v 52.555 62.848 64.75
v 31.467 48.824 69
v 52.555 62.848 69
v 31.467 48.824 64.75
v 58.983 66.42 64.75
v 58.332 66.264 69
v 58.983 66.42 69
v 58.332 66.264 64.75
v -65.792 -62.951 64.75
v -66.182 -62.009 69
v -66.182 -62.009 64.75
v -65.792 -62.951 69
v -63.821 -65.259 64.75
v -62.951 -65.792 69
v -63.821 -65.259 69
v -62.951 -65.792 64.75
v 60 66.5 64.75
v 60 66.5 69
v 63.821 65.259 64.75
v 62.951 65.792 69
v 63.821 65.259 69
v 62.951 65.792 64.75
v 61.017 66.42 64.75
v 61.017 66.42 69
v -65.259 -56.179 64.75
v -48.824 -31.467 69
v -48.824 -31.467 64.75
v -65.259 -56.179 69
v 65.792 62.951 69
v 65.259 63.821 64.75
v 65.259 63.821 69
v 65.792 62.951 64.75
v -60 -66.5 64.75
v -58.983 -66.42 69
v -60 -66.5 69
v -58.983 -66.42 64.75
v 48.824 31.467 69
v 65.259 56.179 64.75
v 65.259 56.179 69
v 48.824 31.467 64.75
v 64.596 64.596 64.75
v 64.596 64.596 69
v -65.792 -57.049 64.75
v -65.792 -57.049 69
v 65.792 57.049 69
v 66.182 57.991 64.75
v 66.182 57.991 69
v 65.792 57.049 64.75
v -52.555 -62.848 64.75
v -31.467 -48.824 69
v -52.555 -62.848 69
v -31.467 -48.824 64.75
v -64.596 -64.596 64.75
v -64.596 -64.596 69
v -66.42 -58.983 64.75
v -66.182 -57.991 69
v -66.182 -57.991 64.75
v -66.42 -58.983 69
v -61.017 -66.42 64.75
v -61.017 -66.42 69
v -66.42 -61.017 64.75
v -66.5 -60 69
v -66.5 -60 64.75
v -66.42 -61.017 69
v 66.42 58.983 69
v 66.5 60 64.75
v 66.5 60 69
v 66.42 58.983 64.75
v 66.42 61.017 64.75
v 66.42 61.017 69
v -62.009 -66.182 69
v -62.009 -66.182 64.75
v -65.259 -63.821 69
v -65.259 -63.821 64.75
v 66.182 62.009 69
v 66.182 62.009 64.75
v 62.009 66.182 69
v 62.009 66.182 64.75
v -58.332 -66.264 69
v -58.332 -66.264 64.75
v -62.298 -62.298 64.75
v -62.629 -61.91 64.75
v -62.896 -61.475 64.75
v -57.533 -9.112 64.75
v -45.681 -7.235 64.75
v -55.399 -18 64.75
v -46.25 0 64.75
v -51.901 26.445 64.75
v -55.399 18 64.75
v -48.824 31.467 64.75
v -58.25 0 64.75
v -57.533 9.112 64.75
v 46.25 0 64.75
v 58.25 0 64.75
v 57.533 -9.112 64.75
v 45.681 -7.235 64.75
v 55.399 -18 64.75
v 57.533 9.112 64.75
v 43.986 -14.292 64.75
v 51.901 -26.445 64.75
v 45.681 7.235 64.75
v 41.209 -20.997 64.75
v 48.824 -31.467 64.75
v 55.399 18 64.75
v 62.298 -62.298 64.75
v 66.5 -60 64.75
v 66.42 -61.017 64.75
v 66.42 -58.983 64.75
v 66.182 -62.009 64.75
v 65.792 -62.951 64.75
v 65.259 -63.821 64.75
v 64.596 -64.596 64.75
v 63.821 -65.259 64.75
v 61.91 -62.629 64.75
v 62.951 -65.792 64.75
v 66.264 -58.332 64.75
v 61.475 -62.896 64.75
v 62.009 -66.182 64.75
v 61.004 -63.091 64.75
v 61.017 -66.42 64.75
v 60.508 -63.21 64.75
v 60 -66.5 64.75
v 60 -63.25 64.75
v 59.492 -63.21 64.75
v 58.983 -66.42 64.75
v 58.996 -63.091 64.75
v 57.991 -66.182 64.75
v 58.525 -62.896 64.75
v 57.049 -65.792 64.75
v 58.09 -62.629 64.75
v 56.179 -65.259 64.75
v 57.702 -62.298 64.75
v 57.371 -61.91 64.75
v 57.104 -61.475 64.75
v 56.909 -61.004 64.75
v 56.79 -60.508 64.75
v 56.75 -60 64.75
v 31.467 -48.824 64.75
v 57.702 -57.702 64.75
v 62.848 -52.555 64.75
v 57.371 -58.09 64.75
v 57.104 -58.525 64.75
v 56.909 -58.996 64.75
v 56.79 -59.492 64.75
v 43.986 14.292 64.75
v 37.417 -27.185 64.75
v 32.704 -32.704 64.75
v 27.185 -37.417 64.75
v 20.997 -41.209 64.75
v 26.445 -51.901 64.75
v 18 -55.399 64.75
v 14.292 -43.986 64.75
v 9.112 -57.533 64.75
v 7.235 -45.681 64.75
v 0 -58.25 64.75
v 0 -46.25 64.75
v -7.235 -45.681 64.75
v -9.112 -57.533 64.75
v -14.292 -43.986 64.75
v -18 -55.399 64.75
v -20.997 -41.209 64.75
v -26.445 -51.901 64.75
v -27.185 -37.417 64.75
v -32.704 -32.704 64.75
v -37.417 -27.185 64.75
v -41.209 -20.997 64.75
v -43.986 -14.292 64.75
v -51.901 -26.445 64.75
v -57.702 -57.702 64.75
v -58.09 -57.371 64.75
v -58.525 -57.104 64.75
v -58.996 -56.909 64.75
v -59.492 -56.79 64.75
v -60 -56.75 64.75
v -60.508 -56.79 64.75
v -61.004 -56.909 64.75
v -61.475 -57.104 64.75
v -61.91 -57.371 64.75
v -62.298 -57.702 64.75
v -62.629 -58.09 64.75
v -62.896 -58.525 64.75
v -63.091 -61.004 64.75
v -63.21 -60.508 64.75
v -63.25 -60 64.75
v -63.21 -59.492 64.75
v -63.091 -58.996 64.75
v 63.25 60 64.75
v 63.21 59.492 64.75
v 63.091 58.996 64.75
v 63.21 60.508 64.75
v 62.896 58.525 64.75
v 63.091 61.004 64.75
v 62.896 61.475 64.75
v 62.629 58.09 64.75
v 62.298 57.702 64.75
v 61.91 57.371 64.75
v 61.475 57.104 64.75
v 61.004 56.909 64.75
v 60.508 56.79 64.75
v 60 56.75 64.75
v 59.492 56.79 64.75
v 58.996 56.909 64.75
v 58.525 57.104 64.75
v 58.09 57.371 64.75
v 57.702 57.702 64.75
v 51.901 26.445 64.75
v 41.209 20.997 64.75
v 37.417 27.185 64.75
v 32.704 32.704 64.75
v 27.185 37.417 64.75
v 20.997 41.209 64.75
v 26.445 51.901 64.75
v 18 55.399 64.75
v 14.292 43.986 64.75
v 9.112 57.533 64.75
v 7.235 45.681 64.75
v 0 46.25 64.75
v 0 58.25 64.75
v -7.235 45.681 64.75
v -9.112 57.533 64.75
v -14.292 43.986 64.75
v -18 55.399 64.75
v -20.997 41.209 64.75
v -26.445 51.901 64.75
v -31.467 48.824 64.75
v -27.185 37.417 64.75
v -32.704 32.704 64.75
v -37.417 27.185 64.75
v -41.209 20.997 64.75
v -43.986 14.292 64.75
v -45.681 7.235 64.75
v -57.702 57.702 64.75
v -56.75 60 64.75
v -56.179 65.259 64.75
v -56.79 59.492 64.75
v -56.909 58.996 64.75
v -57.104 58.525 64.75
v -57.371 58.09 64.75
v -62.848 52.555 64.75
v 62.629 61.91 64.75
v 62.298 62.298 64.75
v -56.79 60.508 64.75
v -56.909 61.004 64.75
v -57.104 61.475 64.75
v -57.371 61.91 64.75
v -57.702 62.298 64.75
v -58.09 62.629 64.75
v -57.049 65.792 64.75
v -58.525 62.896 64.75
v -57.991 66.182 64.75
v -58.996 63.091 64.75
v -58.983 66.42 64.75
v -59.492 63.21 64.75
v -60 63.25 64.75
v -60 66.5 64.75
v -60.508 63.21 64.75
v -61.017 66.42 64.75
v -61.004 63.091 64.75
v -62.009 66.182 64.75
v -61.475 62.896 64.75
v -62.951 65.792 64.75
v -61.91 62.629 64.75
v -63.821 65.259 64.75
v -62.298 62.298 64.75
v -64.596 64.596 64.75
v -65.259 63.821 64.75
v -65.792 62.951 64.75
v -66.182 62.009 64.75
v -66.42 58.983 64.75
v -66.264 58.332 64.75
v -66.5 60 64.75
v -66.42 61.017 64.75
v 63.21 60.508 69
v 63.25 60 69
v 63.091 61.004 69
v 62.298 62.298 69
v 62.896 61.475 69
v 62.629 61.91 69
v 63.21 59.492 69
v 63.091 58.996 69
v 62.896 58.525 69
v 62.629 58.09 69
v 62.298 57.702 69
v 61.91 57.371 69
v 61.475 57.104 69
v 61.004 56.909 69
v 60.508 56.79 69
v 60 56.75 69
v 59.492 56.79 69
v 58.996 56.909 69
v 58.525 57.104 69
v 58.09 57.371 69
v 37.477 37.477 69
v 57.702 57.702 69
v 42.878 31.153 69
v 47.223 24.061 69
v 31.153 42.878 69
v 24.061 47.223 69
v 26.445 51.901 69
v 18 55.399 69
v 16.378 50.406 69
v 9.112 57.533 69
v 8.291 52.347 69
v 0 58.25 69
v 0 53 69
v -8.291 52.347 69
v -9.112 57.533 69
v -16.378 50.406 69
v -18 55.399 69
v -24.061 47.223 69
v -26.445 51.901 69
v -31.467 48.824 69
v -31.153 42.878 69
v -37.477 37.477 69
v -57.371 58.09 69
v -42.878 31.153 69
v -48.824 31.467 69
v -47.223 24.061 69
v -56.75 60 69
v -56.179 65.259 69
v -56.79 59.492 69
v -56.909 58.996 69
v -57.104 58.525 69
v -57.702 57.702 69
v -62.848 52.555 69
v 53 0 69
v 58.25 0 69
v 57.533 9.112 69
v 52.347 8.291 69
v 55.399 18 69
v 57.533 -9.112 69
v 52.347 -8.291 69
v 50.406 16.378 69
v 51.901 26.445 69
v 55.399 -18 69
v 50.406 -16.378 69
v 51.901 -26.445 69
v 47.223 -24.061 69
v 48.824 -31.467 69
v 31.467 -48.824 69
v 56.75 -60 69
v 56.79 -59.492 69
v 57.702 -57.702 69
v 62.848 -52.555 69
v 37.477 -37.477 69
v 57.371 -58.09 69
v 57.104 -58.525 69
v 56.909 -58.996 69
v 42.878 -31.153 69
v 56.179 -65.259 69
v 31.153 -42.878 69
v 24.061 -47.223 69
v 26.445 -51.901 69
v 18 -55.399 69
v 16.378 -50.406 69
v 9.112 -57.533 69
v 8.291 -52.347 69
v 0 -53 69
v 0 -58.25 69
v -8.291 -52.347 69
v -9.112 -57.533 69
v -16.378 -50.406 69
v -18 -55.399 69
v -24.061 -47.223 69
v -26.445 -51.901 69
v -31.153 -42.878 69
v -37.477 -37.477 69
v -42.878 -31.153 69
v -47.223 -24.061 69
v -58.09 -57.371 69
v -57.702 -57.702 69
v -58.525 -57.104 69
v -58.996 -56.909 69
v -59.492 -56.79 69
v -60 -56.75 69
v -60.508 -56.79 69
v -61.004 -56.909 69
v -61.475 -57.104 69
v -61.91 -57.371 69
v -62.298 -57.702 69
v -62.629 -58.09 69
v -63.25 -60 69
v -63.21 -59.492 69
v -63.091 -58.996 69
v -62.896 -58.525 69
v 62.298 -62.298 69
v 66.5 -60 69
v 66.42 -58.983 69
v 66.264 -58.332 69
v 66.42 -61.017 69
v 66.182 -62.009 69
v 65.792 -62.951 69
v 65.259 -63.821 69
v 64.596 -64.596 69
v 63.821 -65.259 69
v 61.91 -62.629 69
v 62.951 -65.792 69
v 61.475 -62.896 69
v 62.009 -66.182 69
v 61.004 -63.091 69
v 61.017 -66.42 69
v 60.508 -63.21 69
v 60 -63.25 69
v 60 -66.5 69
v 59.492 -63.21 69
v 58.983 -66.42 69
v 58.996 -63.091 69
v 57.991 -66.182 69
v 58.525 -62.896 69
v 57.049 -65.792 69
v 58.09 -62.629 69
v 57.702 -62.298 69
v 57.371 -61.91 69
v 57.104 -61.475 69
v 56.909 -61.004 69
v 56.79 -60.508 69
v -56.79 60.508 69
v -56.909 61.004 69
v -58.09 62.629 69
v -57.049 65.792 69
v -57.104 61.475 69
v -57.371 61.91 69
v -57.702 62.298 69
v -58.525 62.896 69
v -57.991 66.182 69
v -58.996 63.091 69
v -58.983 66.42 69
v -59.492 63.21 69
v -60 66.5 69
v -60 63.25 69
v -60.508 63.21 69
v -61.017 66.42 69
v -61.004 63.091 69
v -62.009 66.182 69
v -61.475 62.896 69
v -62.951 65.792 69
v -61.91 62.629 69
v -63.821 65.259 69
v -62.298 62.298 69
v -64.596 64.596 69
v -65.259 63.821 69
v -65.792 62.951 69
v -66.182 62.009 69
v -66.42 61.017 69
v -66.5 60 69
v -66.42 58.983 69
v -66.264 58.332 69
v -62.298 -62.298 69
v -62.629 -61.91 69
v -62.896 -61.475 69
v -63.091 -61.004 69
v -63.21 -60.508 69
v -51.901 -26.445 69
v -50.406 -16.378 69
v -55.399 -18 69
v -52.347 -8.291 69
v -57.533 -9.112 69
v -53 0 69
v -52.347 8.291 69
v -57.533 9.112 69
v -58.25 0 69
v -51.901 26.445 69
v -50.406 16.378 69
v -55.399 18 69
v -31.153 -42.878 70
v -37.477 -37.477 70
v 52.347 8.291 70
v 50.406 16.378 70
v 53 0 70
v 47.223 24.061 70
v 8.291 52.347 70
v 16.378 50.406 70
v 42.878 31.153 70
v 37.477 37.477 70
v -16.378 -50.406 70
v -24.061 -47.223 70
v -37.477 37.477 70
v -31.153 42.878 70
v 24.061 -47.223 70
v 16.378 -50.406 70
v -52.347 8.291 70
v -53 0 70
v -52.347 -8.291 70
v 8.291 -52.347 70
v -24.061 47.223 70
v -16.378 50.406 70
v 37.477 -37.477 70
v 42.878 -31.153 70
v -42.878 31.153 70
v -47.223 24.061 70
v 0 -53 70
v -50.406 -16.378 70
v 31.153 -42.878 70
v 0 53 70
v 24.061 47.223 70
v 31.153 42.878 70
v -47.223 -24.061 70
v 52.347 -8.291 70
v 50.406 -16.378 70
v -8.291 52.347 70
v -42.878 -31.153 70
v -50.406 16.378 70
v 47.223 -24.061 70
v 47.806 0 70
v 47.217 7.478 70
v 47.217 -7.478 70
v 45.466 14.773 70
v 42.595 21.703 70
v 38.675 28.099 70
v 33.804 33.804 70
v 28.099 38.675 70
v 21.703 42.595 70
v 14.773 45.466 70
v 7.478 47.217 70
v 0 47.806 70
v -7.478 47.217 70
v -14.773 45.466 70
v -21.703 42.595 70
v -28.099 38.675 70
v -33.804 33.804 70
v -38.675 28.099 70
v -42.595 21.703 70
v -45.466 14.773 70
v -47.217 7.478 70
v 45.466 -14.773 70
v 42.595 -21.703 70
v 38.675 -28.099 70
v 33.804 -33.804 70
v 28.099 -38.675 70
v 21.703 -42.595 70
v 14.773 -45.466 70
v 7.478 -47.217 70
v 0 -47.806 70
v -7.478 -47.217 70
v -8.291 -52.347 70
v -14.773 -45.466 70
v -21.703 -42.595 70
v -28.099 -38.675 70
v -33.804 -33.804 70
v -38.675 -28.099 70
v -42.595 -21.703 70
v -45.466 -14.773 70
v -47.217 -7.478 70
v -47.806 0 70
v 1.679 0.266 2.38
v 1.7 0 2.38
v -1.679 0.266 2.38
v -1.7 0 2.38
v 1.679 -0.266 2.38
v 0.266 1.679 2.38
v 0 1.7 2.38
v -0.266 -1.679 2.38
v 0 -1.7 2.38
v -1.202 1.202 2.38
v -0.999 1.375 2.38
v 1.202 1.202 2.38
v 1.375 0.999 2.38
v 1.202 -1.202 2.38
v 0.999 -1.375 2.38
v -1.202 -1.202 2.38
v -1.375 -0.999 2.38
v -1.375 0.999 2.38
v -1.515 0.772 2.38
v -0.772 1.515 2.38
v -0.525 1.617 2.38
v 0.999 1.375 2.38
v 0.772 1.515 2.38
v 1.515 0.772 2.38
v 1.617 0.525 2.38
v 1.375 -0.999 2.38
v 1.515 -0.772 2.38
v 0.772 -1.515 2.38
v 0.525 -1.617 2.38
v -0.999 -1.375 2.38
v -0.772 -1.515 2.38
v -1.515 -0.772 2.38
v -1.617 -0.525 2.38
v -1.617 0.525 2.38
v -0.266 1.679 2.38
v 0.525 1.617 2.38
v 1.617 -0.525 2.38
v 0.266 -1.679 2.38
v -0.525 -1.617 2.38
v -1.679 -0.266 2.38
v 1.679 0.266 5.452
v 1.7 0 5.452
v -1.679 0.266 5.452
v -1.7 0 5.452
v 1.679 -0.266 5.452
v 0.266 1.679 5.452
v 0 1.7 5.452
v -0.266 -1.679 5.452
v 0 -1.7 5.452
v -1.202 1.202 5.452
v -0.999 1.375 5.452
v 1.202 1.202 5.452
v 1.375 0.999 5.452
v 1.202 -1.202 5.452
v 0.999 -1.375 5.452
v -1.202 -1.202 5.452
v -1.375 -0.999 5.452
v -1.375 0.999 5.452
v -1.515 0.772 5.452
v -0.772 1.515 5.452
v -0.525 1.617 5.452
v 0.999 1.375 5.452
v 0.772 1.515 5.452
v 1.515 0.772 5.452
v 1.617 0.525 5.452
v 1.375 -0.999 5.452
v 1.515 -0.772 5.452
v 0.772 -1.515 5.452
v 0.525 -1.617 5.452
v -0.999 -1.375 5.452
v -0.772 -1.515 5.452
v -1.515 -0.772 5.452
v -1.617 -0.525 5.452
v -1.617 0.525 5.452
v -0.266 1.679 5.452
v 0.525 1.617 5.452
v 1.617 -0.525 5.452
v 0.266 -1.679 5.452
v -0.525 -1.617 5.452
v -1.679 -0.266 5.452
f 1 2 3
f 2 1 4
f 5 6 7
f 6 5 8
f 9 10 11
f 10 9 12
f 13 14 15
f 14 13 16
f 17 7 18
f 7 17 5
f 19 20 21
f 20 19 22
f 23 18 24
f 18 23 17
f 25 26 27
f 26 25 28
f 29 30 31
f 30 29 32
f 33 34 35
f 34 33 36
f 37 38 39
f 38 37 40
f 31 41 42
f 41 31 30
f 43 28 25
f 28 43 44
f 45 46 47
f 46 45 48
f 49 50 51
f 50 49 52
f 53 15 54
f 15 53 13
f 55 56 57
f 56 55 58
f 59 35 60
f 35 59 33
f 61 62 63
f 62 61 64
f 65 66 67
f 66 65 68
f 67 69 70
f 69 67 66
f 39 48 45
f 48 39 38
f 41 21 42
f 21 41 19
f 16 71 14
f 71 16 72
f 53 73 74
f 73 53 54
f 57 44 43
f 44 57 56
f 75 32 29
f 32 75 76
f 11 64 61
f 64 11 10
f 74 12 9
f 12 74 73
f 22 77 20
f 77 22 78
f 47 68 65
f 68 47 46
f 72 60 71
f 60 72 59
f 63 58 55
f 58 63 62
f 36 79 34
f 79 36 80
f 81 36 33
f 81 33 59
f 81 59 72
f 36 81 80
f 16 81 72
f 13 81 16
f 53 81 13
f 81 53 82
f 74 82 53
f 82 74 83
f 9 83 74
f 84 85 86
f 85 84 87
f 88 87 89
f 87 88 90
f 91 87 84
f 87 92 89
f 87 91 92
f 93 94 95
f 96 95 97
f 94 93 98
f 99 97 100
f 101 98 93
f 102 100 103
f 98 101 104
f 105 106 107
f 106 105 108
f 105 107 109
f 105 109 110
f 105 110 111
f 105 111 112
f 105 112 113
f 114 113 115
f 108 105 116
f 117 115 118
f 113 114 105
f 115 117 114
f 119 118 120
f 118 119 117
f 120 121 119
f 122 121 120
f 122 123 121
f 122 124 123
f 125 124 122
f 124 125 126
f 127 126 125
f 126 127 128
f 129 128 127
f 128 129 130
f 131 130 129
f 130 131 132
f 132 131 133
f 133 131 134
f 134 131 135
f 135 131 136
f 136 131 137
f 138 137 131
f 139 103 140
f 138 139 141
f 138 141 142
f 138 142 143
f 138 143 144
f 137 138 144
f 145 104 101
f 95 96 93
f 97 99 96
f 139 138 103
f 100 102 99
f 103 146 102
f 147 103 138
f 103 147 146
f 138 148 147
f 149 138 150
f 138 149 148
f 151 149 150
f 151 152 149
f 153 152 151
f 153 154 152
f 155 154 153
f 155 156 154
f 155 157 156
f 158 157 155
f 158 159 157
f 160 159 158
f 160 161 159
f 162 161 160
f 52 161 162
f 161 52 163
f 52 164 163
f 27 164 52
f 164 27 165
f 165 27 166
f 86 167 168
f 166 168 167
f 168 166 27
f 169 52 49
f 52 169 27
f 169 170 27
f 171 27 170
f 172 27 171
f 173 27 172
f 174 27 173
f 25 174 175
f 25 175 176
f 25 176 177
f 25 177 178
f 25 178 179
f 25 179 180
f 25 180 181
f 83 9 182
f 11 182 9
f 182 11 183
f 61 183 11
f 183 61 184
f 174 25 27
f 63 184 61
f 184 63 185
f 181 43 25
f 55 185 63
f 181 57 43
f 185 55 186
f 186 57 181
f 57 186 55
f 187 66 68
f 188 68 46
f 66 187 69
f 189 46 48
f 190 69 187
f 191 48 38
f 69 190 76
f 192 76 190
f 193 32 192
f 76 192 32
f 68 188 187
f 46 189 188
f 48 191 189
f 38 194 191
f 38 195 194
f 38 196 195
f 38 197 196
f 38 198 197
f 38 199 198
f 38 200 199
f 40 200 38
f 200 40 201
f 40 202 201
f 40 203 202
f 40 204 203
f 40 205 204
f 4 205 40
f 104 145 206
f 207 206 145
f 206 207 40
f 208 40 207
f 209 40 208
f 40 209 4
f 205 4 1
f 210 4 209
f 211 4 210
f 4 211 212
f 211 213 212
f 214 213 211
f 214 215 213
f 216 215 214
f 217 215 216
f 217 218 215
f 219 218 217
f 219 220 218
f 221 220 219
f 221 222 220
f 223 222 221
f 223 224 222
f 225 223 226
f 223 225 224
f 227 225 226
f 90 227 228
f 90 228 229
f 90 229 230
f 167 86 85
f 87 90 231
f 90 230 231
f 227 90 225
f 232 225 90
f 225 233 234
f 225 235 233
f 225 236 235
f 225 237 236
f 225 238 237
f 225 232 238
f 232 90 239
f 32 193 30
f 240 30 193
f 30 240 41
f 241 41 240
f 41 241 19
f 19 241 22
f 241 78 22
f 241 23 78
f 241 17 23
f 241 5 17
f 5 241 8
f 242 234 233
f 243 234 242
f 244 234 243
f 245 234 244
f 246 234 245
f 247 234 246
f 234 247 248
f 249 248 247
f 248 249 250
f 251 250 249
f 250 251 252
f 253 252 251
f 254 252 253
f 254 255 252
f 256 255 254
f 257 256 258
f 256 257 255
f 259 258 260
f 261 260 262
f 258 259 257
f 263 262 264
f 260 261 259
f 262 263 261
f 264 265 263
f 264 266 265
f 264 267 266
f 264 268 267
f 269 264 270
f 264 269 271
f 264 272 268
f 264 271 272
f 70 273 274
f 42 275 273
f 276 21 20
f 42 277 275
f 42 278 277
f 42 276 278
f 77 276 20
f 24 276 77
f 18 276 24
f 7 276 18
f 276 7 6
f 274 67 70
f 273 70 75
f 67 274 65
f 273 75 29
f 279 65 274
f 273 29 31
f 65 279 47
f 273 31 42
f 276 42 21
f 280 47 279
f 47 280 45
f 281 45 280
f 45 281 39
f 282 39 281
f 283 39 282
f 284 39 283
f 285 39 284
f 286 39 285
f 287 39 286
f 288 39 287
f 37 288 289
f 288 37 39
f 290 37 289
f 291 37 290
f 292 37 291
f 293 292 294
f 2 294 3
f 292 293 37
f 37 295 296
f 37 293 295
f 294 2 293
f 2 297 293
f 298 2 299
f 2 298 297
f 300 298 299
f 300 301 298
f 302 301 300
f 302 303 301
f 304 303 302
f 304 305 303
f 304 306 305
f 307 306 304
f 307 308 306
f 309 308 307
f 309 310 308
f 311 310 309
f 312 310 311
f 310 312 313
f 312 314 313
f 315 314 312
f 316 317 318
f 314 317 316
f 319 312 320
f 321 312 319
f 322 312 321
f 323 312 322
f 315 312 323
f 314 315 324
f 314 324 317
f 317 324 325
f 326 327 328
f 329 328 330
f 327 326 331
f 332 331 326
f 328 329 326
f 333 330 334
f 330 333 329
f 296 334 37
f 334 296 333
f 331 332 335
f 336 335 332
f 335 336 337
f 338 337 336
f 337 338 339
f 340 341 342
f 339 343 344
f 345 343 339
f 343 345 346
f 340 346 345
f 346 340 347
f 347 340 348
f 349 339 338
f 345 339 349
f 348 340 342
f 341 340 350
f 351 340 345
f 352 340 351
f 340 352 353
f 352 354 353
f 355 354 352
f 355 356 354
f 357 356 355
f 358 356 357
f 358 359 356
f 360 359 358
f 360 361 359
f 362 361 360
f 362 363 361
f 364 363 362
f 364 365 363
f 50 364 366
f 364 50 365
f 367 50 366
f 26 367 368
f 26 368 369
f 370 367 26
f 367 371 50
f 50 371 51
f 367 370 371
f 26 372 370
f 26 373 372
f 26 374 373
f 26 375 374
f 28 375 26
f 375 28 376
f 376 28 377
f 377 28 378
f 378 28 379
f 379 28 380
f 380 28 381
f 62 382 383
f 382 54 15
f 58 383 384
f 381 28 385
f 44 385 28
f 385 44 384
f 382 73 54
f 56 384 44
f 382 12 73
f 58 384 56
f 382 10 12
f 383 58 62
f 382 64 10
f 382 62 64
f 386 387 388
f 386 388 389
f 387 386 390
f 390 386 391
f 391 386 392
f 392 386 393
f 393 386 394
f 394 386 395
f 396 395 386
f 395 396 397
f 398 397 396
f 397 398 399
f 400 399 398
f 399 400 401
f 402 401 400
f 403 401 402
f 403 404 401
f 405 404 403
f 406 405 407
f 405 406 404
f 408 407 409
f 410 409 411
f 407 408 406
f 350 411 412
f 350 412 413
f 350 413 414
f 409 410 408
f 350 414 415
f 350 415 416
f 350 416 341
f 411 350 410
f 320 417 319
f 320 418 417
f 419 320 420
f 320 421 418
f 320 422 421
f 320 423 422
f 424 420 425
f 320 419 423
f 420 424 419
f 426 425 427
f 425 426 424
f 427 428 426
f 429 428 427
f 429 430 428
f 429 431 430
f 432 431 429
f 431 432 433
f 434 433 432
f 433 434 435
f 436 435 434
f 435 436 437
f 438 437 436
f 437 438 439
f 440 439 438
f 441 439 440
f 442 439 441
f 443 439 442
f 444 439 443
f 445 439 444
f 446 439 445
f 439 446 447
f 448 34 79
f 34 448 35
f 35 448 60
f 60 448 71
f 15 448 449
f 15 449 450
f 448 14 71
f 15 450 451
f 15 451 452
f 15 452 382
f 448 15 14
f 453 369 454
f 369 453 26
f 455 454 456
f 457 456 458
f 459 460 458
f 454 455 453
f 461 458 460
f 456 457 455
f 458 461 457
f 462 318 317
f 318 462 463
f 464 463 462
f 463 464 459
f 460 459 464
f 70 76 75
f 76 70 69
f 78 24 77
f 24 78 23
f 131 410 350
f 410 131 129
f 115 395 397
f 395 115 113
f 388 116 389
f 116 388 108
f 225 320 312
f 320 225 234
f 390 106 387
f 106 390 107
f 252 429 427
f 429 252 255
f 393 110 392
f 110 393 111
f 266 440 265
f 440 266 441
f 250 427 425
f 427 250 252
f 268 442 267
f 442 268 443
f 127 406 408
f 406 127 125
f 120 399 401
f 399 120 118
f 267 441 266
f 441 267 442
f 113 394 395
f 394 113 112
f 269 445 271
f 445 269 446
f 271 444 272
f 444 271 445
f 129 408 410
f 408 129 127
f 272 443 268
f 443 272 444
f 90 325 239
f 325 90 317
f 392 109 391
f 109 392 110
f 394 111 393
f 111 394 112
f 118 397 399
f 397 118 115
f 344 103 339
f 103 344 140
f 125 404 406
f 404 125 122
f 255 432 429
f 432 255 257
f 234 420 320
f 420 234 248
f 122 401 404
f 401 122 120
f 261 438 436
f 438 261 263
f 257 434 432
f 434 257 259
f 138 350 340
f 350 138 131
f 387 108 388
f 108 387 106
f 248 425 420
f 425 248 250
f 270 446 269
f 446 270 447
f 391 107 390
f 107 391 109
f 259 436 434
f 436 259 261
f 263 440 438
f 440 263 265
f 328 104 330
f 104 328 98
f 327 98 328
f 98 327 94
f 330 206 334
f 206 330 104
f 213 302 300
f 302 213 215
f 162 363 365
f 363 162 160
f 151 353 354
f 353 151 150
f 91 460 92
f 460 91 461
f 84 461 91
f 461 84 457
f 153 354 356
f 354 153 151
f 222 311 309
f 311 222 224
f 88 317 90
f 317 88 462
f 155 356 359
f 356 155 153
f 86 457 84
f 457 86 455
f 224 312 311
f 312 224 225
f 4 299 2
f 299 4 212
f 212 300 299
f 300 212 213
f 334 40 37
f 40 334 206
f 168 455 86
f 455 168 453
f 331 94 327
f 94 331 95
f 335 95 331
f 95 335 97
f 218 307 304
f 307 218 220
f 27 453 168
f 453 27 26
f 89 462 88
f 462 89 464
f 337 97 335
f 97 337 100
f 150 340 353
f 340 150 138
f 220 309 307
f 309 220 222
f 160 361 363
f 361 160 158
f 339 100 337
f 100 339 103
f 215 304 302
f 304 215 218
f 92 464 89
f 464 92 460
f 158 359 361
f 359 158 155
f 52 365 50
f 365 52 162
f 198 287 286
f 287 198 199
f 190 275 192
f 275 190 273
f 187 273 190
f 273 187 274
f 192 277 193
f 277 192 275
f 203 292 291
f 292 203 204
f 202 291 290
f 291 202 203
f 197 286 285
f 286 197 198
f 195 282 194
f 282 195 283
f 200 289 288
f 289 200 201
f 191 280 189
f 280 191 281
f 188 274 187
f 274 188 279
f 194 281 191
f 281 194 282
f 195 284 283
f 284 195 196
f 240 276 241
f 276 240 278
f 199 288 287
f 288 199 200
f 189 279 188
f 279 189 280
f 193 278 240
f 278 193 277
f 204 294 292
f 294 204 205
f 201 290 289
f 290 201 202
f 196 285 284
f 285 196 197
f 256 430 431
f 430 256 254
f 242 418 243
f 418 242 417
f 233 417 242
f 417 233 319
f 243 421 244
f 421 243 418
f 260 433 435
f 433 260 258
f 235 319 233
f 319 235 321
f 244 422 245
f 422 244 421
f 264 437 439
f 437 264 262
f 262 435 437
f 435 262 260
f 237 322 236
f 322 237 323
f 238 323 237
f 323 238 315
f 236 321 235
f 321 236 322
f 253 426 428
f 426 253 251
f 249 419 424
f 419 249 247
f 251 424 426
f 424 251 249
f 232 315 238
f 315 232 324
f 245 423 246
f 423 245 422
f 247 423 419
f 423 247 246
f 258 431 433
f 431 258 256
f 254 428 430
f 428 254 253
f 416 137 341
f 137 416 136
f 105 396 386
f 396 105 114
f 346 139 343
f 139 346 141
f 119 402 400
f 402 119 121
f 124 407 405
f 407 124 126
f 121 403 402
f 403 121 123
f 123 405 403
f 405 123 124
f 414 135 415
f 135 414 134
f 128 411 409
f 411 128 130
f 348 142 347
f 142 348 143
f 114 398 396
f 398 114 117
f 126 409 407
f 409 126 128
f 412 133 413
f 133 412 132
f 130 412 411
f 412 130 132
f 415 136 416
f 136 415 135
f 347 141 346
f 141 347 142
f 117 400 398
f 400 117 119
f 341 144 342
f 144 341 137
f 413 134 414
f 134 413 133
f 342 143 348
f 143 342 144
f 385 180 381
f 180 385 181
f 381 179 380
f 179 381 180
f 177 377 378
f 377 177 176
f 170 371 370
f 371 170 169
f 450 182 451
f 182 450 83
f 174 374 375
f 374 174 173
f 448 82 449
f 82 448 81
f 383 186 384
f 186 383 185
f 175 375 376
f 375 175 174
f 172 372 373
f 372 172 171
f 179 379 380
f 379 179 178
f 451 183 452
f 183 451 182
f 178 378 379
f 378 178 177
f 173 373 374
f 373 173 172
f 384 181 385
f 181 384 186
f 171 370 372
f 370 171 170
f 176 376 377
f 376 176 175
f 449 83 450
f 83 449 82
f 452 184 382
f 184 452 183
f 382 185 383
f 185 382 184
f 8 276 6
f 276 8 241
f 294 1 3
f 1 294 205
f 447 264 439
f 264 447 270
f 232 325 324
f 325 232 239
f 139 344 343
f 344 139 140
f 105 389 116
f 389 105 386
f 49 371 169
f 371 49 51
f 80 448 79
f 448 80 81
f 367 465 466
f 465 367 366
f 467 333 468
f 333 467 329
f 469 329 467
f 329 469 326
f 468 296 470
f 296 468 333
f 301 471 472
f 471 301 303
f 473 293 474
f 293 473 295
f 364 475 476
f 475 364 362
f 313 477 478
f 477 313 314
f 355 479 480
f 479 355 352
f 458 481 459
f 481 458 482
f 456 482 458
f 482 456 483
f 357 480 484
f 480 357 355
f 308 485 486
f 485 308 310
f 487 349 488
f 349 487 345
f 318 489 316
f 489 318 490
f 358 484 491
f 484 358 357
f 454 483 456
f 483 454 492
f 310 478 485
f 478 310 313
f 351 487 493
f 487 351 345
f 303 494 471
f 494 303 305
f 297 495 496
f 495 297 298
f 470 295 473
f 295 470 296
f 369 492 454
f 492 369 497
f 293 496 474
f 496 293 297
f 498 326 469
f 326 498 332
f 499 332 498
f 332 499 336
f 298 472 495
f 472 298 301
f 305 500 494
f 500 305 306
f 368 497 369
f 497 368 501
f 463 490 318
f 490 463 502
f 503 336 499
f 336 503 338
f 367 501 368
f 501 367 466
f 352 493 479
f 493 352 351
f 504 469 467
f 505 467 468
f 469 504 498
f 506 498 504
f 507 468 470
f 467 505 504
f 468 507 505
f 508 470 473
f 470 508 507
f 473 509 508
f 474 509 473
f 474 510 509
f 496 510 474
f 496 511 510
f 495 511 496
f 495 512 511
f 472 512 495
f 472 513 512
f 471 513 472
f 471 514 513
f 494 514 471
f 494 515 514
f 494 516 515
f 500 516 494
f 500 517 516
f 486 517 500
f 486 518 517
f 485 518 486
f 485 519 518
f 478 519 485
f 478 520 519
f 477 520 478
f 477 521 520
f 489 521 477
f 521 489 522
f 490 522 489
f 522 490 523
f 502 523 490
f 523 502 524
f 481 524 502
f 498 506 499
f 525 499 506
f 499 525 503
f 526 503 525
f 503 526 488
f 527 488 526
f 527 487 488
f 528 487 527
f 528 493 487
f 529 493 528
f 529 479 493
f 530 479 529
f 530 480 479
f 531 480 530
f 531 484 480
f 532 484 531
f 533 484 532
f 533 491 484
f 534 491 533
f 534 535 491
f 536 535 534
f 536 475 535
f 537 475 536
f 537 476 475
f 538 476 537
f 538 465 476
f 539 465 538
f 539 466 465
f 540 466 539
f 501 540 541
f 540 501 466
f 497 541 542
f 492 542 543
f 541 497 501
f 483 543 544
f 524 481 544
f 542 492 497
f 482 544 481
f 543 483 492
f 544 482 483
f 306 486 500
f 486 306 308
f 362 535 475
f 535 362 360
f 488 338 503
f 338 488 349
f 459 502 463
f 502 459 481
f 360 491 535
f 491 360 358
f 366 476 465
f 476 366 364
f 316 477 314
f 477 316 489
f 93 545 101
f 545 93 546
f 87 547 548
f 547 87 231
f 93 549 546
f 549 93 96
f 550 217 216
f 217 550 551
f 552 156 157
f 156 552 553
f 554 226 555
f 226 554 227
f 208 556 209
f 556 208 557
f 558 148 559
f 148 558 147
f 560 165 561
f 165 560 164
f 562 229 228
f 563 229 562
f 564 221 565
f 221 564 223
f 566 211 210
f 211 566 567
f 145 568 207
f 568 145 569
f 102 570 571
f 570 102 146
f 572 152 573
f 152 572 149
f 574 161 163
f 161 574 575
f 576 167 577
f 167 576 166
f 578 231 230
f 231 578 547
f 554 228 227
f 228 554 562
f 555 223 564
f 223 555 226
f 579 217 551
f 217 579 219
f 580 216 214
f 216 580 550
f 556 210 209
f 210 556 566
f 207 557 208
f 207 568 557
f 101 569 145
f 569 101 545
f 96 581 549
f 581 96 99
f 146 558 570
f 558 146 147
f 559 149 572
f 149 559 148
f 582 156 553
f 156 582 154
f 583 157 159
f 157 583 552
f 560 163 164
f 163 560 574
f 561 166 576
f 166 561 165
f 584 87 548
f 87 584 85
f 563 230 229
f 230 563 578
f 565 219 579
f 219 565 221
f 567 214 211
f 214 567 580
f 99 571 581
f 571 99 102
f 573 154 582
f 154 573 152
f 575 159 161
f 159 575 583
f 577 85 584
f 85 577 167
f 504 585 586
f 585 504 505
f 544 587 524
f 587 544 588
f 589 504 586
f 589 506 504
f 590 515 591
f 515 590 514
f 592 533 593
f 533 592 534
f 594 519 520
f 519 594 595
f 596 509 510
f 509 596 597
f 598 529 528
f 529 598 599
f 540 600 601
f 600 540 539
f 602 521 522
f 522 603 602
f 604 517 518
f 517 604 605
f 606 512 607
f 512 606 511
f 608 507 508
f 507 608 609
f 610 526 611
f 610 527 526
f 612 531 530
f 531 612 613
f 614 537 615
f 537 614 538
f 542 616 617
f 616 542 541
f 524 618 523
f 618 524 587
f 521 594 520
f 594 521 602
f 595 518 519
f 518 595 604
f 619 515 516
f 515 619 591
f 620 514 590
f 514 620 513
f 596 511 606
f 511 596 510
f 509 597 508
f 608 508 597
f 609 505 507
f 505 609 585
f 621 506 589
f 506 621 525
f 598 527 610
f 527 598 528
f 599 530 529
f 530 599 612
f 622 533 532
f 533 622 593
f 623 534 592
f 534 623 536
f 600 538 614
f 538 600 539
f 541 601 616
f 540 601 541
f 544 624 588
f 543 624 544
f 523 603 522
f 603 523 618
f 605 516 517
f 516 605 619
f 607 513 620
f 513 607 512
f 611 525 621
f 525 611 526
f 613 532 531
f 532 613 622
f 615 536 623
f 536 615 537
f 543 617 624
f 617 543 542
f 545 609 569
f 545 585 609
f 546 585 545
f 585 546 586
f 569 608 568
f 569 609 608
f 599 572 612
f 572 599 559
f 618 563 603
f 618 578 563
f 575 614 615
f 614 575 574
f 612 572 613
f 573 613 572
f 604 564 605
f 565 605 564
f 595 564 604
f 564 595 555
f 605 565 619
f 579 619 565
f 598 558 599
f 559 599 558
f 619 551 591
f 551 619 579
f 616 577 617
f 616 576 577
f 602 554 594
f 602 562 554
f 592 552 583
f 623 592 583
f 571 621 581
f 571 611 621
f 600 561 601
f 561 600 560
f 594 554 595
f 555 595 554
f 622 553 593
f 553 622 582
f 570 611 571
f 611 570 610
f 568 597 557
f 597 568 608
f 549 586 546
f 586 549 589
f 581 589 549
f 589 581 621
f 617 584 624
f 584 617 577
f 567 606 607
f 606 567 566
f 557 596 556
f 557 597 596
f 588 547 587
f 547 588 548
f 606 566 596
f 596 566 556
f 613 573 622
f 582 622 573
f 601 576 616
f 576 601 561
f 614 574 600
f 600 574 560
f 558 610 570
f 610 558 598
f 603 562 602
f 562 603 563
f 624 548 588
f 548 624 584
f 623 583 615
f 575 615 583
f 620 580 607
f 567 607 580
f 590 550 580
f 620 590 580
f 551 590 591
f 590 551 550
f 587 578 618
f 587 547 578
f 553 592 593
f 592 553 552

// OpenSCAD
// file: jplib.scad
x_axis = [1,0,0];
y_axis = [0,1,0];
z_axis = [0,0,1];

secondary_r = 4;
secondary_as_cube = false;

module tablet(v, center=true,r = secondary_r) {
    if (secondary_as_cube) {
        cube(v, center=center);
    }
    else {
        hull() {
            for (i = [1,-1]) {
                for (j = [1,-1]) {
                    translate([i*v[0]/2-i*r,j*v[1]/2-j*r,0])
                        cylinder(r=r, h=v[2], center=center);
                }        
            }
        }
    }
}

module stone(v, center=true,r = secondary_r) {
    if (secondary_as_cube) {
        cube(v, center=center);
    }
    else {
        hull() {
            for (i = [1,-1]) {
                for (j = [1,-1]) {
                    for (k = [1,-1]) {
                        translate([i*v[0]/2-i*r,j*v[1]/2-j*r,k*v[2]/2-k*r])
                            sphere(r=r, center=center);
                    }        
                }        
            }
        }
    }
}

module giftwrap(bounds = [1000,1000,1000], tail=[0,0,0]) {
    union() {
        intersection() {
            rotate(90 ,y_axis) linear_extrude(height=bounds[0], center=true) hull() projection() rotate(90 ,y_axis) children();
            rotate(90 ,x_axis) linear_extrude(height=bounds[1], center=true) hull() projection() rotate(90 ,x_axis) children();
            linear_extrude(height=bounds[2], center=true) hull() projection() children();
        }
        if (tail[0] != 0) {
            translate([tail[0]*bounds[0]/2,0,0]) rotate(90 ,y_axis) linear_extrude(height=bounds[0], center=true) hull() projection() rotate(90 ,y_axis) children();
        }
        if (tail[1] != 0) {
            translate([0,tail[1]*bounds[0]/2,0]) rotate(90 ,x_axis) linear_extrude(height=bounds[1], center=true) hull() projection() rotate(90 ,x_axis) children();
        }
    }
}
// file: trapezoid_groove.scad
module trapezoid_groove(
    d = 20,
    belt_width=2,
    slope=.5,
    ){
        inside_corner=belt_width/2;
        outside_corner_x=
            inside_corner
            +belt_width*4;
        outside_corner_y=
            inside_corner 
            + outside_corner_x*slope;
        
        rotate_extrude()
        translate([d/2,0,0])
        polygon(points=[
            [0,-inside_corner],[0,inside_corner],
            [outside_corner_x,outside_corner_y],
            [outside_corner_x,-outside_corner_y],
        ]);
}
// file: bearing.scad
include <settings.scad>
//$fn=30;


module bearing(id = drive_axle_bearing_id, od = drive_axle_bearing_od, t = drive_axle_bearing_t) {
    difference() {
        cylinder(r=od/2, h=t, center=true);
        cylinder(r=id/2, h=t*2, center=true);
    }
}

module bearing_holder(
    od = drive_axle_bearing_od,
    t = drive_axle_bearing_t,
    wall=bearing_holder_wall,
    tie_hole_r = bearing_holder_tie_hole_r
) {
    extra_length = wall*4 + tie_hole_r*4;
    tie_width = wall*2 + tie_hole_r*6;
    difference() {
        union() {
            cylinder(r=od/2+wall, h=t+wall*2, center=true);
            cube([od+extra_length,tie_width,t+wall*2], center=true);
        }
        cylinder(r=od/2-wall, h=t*3, center=true);
        bearing();
        translate([od/2+wall+tie_hole_r,tie_hole_r*2,0])
        cylinder(r=tie_hole_r, h=t*2, center=true);
        translate([-od/2-wall-tie_hole_r,tie_hole_r*2,0])
        cylinder(r=tie_hole_r, h=t*2, center=true);

        translate([od/2+wall+tie_hole_r,-tie_hole_r*2,0])
        cylinder(r=tie_hole_r, h=t*2, center=true);
        translate([-od/2-wall-tie_hole_r,-tie_hole_r*2,0])
        cylinder(r=tie_hole_r, h=t*2, center=true);
    }
}

module bearing_holder_negative(
    od = drive_axle_bearing_od,
    t = drive_axle_bearing_od +bearing_pillow_rim_t*2,
    wall=bearing_pillow_side_t,
    //tie_hole_r = bearing_holder_tie_hole_r
) {
    //extra_length = wall*4 + tie_hole_r*4-.2;
    //tie_width = wall*2 + tie_hole_r*6-.2;
        union() {
            cylinder(r=od/2+wall-.2, h=t+wall*2, center=true);
          //  cube([od+extra_length,tie_width,t+wall*2], center=true);
        }
     
}
//bearing_holder_negative();

module bearing_holder_bottom(
    od = drive_axle_bearing_od,
    t = drive_axle_bearing_t,
    wall=bearing_holder_wall,
    cut = bearing_holder_cut
) {
    
    difference() {
        bearing_holder();
        translate([0,0,od*3/2-cut])
        cube([od*2,od*3,od*3], center=true);
        translate([0,0,-cut])
        bearing_holder_keyway();
    }
}
//bearing_holder_bottom();

module bearing_holder_top(
    od = drive_axle_bearing_od,
    t = drive_axle_bearing_t,
    wall=bearing_holder_wall,
    cut = bearing_holder_cut
) {
    
    difference() {
        bearing_holder(od=od, t=t, wall=wall, cut=cut);
        translate([0,0,-od*3/2-cut])
        cube([od*2,od*3,od*3], center=true);
    }
    translate([0,0,-cut])
    bearing_holder_key();
}
//rotate(180,[1,0,0])
//bearing_holder_top();

module bearing_holder_pair(
    od = drive_axle_bearing_od,
    t = drive_axle_bearing_t,
    wall=bearing_holder_wall
){
    translate([0,-od/2-wall-2,t/2+wall])
    rotate(180, [0,1,0])
    bearing_holder_top();
    translate([0,od/2+wall+2,t/2+wall])
    bearing_holder_bottom();
}
//bearing_holder_pair();

module bearing_holder_key(
    od = drive_axle_bearing_od,
    t = drive_axle_bearing_t,
    wall=bearing_holder_wall,
    tie_hole_r = bearing_holder_tie_hole_r
) {
    translate([od/2+wall+tie_hole_r,0,0])
    cube([tie_hole_r*2,tie_hole_r,tie_hole_r], center=true);
    translate([-od/2-wall-tie_hole_r,0,0])
    cube([tie_hole_r*2,tie_hole_r,tie_hole_r], center=true);
}
module bearing_holder_keyway(
    od = drive_axle_bearing_od,
    t = drive_axle_bearing_t,
    wall=bearing_holder_wall,
    tie_hole_r = bearing_holder_tie_hole_r,
    clearance = 1
) {
    translate([od/2+wall+tie_hole_r,0,0])
    cube([tie_hole_r*2+clearance,tie_hole_r+clearance,tie_hole_r+clearance], center=true);
    translate([-od/2-wall-tie_hole_r,0,0])
    cube([tie_hole_r*2+clearance,tie_hole_r+clearance,tie_hole_r+clearance], center=true);
}

module bearing_pillow() {

    difference() {
        union() {
            cylinder(r=drive_axle_bearing_od/2 + bearing_pillow_rim_t, h=drive_axle_bearing_t + bearing_pillow_side_t*2, center=true);
            cube([drive_axle_bearing_od+bearing_pillow_rim_t*2+bearing_pillow_screw_head_r*4+2,12,drive_axle_bearing_t + bearing_pillow_side_t*2], center=true);
        }
      cylinder(r=drive_axle_bearing_od/2 - 1, h=drive_axle_bearing_t*8, center=true);
      bearing();
        
      translate([drive_axle_bearing_od/2+bearing_pillow_rim_t+bearing_pillow_screw_head_r,0,0])
        rotate(90,[1,0,0]) 
            cylinder(r=bearing_pillow_screw_thread_r, h=50, center=true);
      translate([drive_axle_bearing_od/2+bearing_pillow_rim_t+bearing_pillow_screw_head_r,10,0])
        rotate(90,[1,0,0]) 
            cylinder(r=bearing_pillow_screw_shank_r, h=20, center=true);
      translate([drive_axle_bearing_od/2+bearing_pillow_rim_t+bearing_pillow_screw_head_r,15,0])
        rotate(90,[1,0,0]) 
            cylinder(r=bearing_pillow_screw_head_r, h=20, center=true);

      translate([-drive_axle_bearing_od/2-bearing_pillow_rim_t-bearing_pillow_screw_head_r,0,0])
        rotate(90,[1,0,0]) 
            cylinder(r=bearing_pillow_screw_thread_r, h=50, center=true);
      translate([-drive_axle_bearing_od/2-bearing_pillow_rim_t-bearing_pillow_screw_head_r,10,0])
        rotate(90,[1,0,0]) 
            cylinder(r=bearing_pillow_screw_shank_r, h=20, center=true);
      translate([-drive_axle_bearing_od/2-bearing_pillow_rim_t-bearing_pillow_screw_head_r,15,0])
        rotate(90,[1,0,0]) 
            cylinder(r=bearing_pillow_screw_head_r, h=20, center=true);
    }
}
module bearing_pillow_negative() {

    cylinder(r=drive_axle_bearing_od/2 + bearing_pillow_rim_t, h=drive_axle_bearing_t + bearing_pillow_side_t*2, center=true);
    cylinder(r=drive_axle_bearing_od/2 + bearing_pillow_rim_t-1, h=drive_axle_bearing_t *4, center=true);
    cube([drive_axle_bearing_od+bearing_pillow_rim_t*2+bearing_pillow_screw_head_r*4+2,12,drive_axle_bearing_t + bearing_pillow_side_t*2], center=true);

}
//%bearing_pillow();
//bearing_pillow_negative();
module bearing_pillow_top() {
   difference() {
        bearing_pillow();
        translate([0,-50,0])
            cube([100,100,100], center=true);
   } 
}
module bearing_pillow_bottom() {
   difference() {
        bearing_pillow();
        translate([0,50,0])
            cube([100,100,100], center=true);
   } 
}
//bearing_pillow_top();
//translate([0,-5,0])
//bearing_pillow_bottom();
//bearing_pillow();
//bearing_holder();
//bearing();
// file: rods.scad
include <settings.scad>
include <jplib.scad>
//include <tracer.scad>
//include <tracer_bearing.scad>
include <bearing.scad>


module frame_rod(r = frame_rod_r, h = frame_length) {
    cylinder(r =r, h = h, center=true);
}
module drive_axle(r = drive_axle_r, h = frame_length) {
    cylinder(r =r, h = h, center=true);
}
//frame_rod();


module frame_rods(x=frame_x, y = frame_y, r = frame_rod_r) {
    translate([x/2,y/2,0])
        frame_rod(r = r);
    translate([-x/2,y/2,0])
        frame_rod(r = r);
    translate([x/2,-y/2,0])
        frame_rod(r = r);
    translate([-x/2,-y/2,0])
        frame_rod(r = r);
    translate([drive_position_x,drive_position_y,0])
        drive_axle();
}

//frame_rods();

module rod_slots_2d(x=frame_x, y=frame_y, spin = 45) {
    for (i = [0:3]) {
        rotate(i*90, z_axis)
        translate([x/2,y/2])
            rotate(spin,z_axis)
        translate([0,frame_rod_r*3])
                square(size = [frame_rod_r*2,frame_rod_r*6], center=true);
    }
}
//rod_slots_2d();
//frame_rods();
    
module rod_slots(h=10) {
    linear_extrude(height=h, center=true) rod_slots_2d();
}

module rod_slots_side_2d(x=frame_x, y=frame_y, spin = 30) {

    translate([x/2,y/2])
    rotate(spin,z_axis)
    translate([0,frame_rod_r*3])
    square(size = [frame_rod_r*2,frame_rod_r*6], center=true);
    
    translate([x/2,-y/2])
    rotate(spin,z_axis)
    translate([0,-frame_rod_r*3])
    square(size = [frame_rod_r*2,frame_rod_r*6], center=true);
}
module rod_slots_side(h=10, spin=90) {
    linear_extrude(height=h, center=true) rod_slots_side_2d(spin=spin);
}

//rod_slots_side();
// file: settings.scad
//
//$fn = 100;
//$fn = 30;
smidge=.01;

lhf = .35;  // Layer Height FFFFirst
lh = .3; // Layer Height

// in this model there are "z axis" tolerances that are 
// in the range of a 3d printer layer height.  Some dimensions 
// need to be modelled as actual printed heights.  Adjust lhf and lh
// (above) for your slicer settings.
// layer_multiple() returns the closest layer height >= a distance
function layer_multiple(z) = (z <= lhf) ? lhf : lhf+lh*(ceil((z-lhf)/lh));
//foo = layer_multiple(100);
//echo(foo);

frame_x = 120;
frame_y = frame_x;
frame_rod_diameter=8;

frame_rod_r = 6.5/2;
frame_length = 500;


drive_axle_r = 8.1/2;
drive_axle_bearing_id = 8;
drive_axle_bearing_od = 22.5;
drive_axle_bearing_t = 8;

bearing_holder_wall = 1.2;
bearing_holder_tie_hole_r = 3/2;
bearing_holder_cut = -1;

bearing_pillow_rim_t = 2;
bearing_pillow_side_t = 1.5;
bearing_pillow_screw_thread_r = 3/2;
bearing_pillow_screw_shank_r = 4/2;
bearing_pillow_screw_head_r = 6/2;

drive_position_x = frame_x/2+ 25;
drive_position_y = 0;

strut_t = layer_multiple(4);

//spool
spool_d = 15;
spool_h = 35;
spool_flange_ratio=.8;
spool_hole = spool_d - 4; // hole diameter
spool_slope=1/6; // angle of conical section
spool_shaft_tol=2;

// rollers for winder 
center_pulley_r = 10;
center_pulley_t = 5;
center_pulley_angle = 45;
center_pulley_axle_r = 1.5;
center_pulley_axle_l = 30;
// file: rb-pulleys.scad
include <trapezoid_groove.scad>

module belt_pulley(
    d = 20,
    shaft_d=4,
    belt_width=2,
    slope=.5,
    t=5
    ){
    
    difference() {
        cylinder(r=d/2+belt_width,h=t, center=true);
        
        cylinder(r=shaft_d/2,h=belt_width*5, center=true);
        
        trapezoid_groove(
            d = d,
            belt_width=belt_width,
            slope=slope
        );
    }
}

//belt_pulley();

module double_pulley(
    d1=15,
    d2=10,
    t=5,
    shaft_d=4,
    belt_width=2,
    slope=.5,
    ) {
    
    translate([0,0,t/2])
    belt_pulley(
        d=d1,
        t=t,
        shaft_d=shaft_d,
        belt_width=belt_width,
        slope=slope
    );
    translate([0,0,t+t/2])
    belt_pulley(
        d=d2,
        t=t,
        shaft_d=shaft_d,
        belt_width=belt_width,
        slope=slope
    );    

}



//belt_pulley();
//reducer_pulley(d1=10,d2=20);
//dia_1=30;

//double_pulley(d1=dia_1,d2=dia_1/4,belt_width=25.4/8,t=7);



//double_pulley(d1=7,d2=15,t=2);
//double_pulley(d1=20,d2=8);
// file: hollow_bearing.scad
include <trapezoid_groove.scad>

inner_hole_r = 10;
shell_wall = 2;
inner_shell_wall = shell_wall;
outer_shell_wall = shell_wall/2;
shell_t = 2; 
flange_w = shell_t*2;
inner_outer_tolerance = .8;
journal_t = 2;
journal_tolerance = 1.2;
journal_tolerance_z = .6;

retainer_t = 1;
retainer_d = inner_shell_wall /2;
retainer_w = retainer_d*2+inner_outer_tolerance;
retainer_tolerance=.4;

shell_r = inner_hole_r + inner_shell_wall + outer_shell_wall + inner_outer_tolerance + flange_w ;
inner_shell_h = journal_t + shell_t*2 + retainer_t*2 + journal_tolerance_z+retainer_tolerance*2;
outer_shell_h = journal_t + shell_t +journal_tolerance_z;


module center_hole(r=inner_hole_r, h=inner_shell_h*8) {
      cylinder(r=r, h=h, center=true);  
}

module retainer_slot(r=inner_hole_r+shell_wall-retainer_d, h=retainer_t+retainer_tolerance) {
    trapezoid_groove(
        d = r*2,
        belt_width=h,
        slope=.4
    );
}

module retainer_ring(r=inner_hole_r+shell_wall-retainer_d, h=retainer_t) {
    difference() {
        cylinder(r=r+retainer_w, h=h, center=true);  
        cylinder(r=r, h=h*2, center=true);
        translate([r+retainer_w/2,0,0])  
            cube([retainer_d*4,retainer_w/2,retainer_t*2], center=true);
    }
}

module translate_retainer() {
        translate([0,0,shell_t*2+journal_t+journal_tolerance_z+retainer_tolerance+retainer_t/2])
        children();
}


module inner_shell(extra_length = 0) {
    //translate([0,0,inner_shell_h/2])
    difference() {
        union() {
            cylinder(r=inner_hole_r+shell_wall, h=inner_shell_h+extra_length);
            //translate([0,0,-inner_shell_h/2+shell_t/2])
           cylinder(r=shell_r, h=shell_t);
        } 
        
        center_hole(r=inner_hole_r);
        translate_retainer()
        retainer_slot();
    }
}

module outer_shell_hole(r=inner_hole_r+inner_shell_wall+inner_outer_tolerance/2, h=60) {
      cylinder(r=r, h=h, center=true);  
}

module outer_shell() {
    translate([0,0,-outer_shell_h/2])
    difference() {
        union() {
            cylinder(r=inner_hole_r+inner_shell_wall+inner_outer_tolerance+outer_shell_wall, h=outer_shell_h, center=true);
            translate([0,0,outer_shell_h/2-shell_t/2])
           cylinder(r=shell_r, h=shell_t, center=true);
        } 
        
        outer_shell_hole();
    }
}

module journal_hole(r=inner_hole_r+inner_shell_wall+outer_shell_wall+journal_tolerance/2+inner_outer_tolerance, h=60) {
      cylinder(r=r, h=h, center=true);  
}

module journal(r = shell_r+flange_w, t = journal_t) {
    difference() {
    cylinder (r=r, h = t, center=true);
        journal_hole();
    }
}



module hollow_bearing_assembly() {
    rotate(180, [0,1,0]) {
        
//intersection() {
translate([0,0,shell_t+journal_t/2+journal_tolerance_z/2])
outer_shell();

    translate([0,0,-shell_t-journal_t/2-journal_tolerance_z/2]) {
    inner_shell();
   translate_retainer()
retainer_ring();
}
    

journal();
//}
}
}
//hollow_bearing_assembly();


module hollow_bearing_print_all() {
translate([0,0,0])
rotate(180, [0,1,0])
outer_shell();
translate([shell_r*2+4,0,0]) 
    inner_shell();
    
translate([0,shell_r*2+flange_w*2,journal_t/2])
journal();
translate([shell_r+flange_w*3+inner_hole_r,shell_r+flange_w*2+inner_hole_r,retainer_t/2])
retainer_ring();
    
}


//hollow_bearing_print_all();
// file: tracer_bearing.scad
include <hollow_bearing.scad>
use <rb-pulleys.scad>

$fn = 100;
inner_hole_r = 35;
shell_wall = 2;
inner_shell_wall = shell_wall;
outer_shell_wall = shell_wall/2;
shell_t = 2; 
flange_w = shell_t*2;
inner_outer_tolerance = .8;
journal_t = 3;
journal_tolerance = 1.2;
journal_tolerance_z = .6;

retainer_t = 1;
retainer_d = inner_shell_wall /2;
retainer_w = retainer_d*2+inner_outer_tolerance;
retainer_tolerance=.4;

tracer_pulley_t = 5;
tracer_single_pulley_t = 7;
tracer_pulley_attach = .1;

tracer_pulley_center_z = shell_t+journal_t/2+journal_tolerance_z/2+tracer_pulley_t/2-tracer_pulley_attach;
//tracer_pulley_center_z =0;
//tracer_pulley_center_z =0;
/*
shell_r = inner_hole_r + inner_shell_wall + outer_shell_wall + inner_outer_tolerance + flange_w ;
inner_shell_h = journal_t + shell_t*2 + retainer_t*2 + journal_tolerance_z+retainer_tolerance*2;
outer_shell_h = journal_t + shell_t +journal_tolerance_z;

*/

module tracer_connect_holes() {
         translate([-inner_hole_r+2,0,-tracer_pulley_t+tracer_pulley_attach])
            cylinder(r=1.5,h=20,center=true);
         translate([inner_hole_r-2,0,-tracer_pulley_t+tracer_pulley_attach])
            cylinder(r=1.5,h=20,center=true);
}

module tracer_connect_tabs() {
    difference() {
        union() {
            translate([inner_hole_r,0,-tracer_pulley_t+tracer_pulley_attach])
                cylinder(r=5,h=2);
            translate([-inner_hole_r,0,-tracer_pulley_t+tracer_pulley_attach])
                cylinder(r=5,h=2);
        }
        tracer_connect_holes();
    }    
}
//tracer_connect_tabs();

module tracer_inner_shell() {

    inner_shell();
    translate([0,0,-tracer_pulley_t/2+tracer_pulley_attach])
    belt_pulley(
        d = shell_r*2-4,
        shaft_d=inner_hole_r*2,
        belt_width=3,
        slope=.5,
        t= tracer_pulley_t
    );
    tracer_connect_tabs();
}

//tracer_inner_shell();

module tracer_outer_shell() {
    outer_shell();
}

module tracer_journal() {
    journal();

}

module tracer_retainer_ring() {
    retainer_ring();
}

module tracer_center_hole() {
    center_hole();
}

module tracer_bearing_assembly() {
//intersection() {
translate([0,0,shell_t+journal_t/2+journal_tolerance_z/2])
tracer_outer_shell();

    translate([0,0,-shell_t-journal_t/2-journal_tolerance_z/2]) {
    tracer_inner_shell();
   translate_retainer()
tracer_retainer_ring();
}
    

tracer_journal();
//}

}
//tracer_bearing_assembly();

module tracer_bearing_print_all() {
translate([0,0,0])
rotate(180, [0,1,0])
tracer_outer_shell();
translate([shell_r*2+4,0,tracer_pulley_t-tracer_pulley_attach]) 
    tracer_inner_shell();
    
translate([0,shell_r*2+flange_w*2,journal_t/2])
tracer_journal();
translate([shell_r+flange_w*3+inner_hole_r,shell_r+flange_w*2+inner_hole_r,retainer_t/2])
tracer_retainer_ring();
    
}


//tracer_bearing_print_all();
// main file
include <tracer_bearing.scad>
include <strut.scad>
//use <rb-pulleys.scad>
//use <rods.scad>

$fn=40;
//tracer_bearing_assembly();
funnel_h = 70;
funnel_r = 50;
funnel_wall = 2.5;
funnel_flange = 3;
funnel_flange_t = 1;

angle=90-atan((funnel_r)/funnel_h);
cone_displacement = funnel_wall/sin(angle);

module funnel(h=funnel_h, r1 = funnel_r, r2=0, hole_r=1.7, wall = 2.5) {

translate([0,0,h/2])
difference() {
    union() {
        translate([0,0,h/2-funnel_flange_t/2])
    cylinder(r=r1+funnel_flange, h = funnel_flange_t, center=true);
    cylinder(r1=r2, r2=r1, h = h, center=true);
    }
    translate([0,0,cone_displacement])
    cylinder(r1=r2, r2=r1, h = h, center=true);
    cylinder(r=hole_r, h = h*3, center=true);
    }

}


module funnel_strut(h=70, r1 = 50, r2=0, hole_r=1.7, wall = 2.5) {
    difference() {

    //
    strut_spinner(ring_r = r1+5);
    translate([0,0,-h/2+strut_t/2+funnel_flange_t+smidge])
    cylinder(r1=r2, r2=r1, h = h, center=true); 
    }
}

//intersection() {
translate([0,0,funnel_h-strut_t/2-1])
funnel_strut();

//!rotate(180,[1,0,0])
funnel();
    
//}
